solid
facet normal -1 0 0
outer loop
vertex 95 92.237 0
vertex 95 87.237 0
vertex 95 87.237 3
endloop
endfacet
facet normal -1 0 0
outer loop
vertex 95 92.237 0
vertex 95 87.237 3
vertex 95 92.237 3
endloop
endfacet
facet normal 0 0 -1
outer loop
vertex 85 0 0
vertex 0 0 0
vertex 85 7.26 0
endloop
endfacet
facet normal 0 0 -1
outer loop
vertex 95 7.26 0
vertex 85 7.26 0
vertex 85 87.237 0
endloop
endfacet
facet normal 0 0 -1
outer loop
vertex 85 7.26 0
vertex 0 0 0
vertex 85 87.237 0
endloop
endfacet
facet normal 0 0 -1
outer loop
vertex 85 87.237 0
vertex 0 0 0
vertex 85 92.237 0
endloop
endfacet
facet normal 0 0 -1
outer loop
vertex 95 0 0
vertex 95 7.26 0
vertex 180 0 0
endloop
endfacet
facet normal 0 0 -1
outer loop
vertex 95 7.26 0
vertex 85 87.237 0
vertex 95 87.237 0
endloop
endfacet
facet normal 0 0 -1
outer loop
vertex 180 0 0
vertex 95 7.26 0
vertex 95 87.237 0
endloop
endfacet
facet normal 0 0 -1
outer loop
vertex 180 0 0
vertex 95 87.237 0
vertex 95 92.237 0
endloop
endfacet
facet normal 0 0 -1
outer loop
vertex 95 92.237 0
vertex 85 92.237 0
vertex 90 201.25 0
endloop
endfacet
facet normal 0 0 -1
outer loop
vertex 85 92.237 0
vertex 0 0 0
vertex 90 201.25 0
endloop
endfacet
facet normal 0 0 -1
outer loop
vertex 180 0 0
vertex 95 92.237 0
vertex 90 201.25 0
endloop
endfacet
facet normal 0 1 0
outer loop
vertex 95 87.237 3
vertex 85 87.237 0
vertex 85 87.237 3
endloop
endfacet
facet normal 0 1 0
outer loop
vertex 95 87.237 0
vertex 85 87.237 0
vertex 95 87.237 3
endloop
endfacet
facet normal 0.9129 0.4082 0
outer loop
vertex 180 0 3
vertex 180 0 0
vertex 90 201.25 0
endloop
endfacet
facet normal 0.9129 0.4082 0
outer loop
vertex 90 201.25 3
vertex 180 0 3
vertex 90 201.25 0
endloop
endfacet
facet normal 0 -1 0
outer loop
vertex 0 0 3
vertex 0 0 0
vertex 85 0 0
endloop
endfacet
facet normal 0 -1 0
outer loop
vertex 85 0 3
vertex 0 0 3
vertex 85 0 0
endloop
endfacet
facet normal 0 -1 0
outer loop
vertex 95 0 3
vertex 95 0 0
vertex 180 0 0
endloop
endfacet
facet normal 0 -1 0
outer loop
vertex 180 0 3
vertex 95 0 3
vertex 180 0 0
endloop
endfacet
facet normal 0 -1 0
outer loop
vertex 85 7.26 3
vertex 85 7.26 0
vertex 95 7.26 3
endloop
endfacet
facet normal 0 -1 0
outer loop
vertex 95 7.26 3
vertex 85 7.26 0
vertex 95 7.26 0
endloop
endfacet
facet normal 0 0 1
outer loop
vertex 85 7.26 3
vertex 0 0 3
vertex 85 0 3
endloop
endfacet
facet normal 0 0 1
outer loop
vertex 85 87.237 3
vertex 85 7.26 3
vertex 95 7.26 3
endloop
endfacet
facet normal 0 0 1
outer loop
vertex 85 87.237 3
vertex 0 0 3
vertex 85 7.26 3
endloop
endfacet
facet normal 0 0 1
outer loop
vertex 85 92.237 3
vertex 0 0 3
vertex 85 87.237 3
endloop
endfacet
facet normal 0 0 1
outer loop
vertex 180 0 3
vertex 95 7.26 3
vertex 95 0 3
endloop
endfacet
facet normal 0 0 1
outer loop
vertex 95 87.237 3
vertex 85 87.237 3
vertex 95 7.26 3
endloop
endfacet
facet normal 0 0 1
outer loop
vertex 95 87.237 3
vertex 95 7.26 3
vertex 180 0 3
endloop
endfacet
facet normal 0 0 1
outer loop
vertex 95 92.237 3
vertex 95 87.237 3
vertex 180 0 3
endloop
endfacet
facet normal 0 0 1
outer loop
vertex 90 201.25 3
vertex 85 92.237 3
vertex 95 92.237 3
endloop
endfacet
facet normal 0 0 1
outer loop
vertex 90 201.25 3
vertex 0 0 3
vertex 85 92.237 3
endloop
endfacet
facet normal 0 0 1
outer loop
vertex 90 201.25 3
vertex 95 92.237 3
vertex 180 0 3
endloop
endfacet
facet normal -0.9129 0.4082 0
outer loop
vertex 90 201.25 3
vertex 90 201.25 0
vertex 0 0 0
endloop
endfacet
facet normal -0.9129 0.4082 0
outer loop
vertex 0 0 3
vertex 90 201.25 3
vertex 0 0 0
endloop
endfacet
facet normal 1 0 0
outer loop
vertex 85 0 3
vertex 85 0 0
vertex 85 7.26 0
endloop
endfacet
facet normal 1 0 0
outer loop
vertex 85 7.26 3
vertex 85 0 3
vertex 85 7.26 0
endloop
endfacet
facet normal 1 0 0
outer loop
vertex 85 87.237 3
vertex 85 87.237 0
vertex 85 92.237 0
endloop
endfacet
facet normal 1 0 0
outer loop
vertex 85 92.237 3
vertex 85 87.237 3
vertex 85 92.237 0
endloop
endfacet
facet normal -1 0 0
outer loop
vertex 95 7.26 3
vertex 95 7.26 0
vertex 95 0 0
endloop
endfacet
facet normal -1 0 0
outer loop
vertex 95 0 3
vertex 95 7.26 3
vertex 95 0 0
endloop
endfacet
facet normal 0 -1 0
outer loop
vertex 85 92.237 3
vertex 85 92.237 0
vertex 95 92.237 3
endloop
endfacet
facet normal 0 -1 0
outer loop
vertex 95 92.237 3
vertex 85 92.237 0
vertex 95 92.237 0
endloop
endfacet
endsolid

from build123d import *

# Parameters (mm, degrees)
SKETCH1_W           = 10
SKETCH1_H           = 5
BOSS_EXTRUDE1_DEPTH = 3


with BuildPart() as part:
    # Sketch1 → Boss-Extrude1 (new body)
    with BuildSketch(Plane.XY):
        Polygon((90, 201.25), (0, 0), (85, 0), (85, 7.26), (95, 7.26), (95, 0), (180, 0), align=None)
        with Locations((90, 89.737444444)):
            Rectangle(SKETCH1_W, SKETCH1_H, mode=Mode.SUBTRACT)
    extrude(amount=BOSS_EXTRUDE1_DEPTH)


solid = part.part
